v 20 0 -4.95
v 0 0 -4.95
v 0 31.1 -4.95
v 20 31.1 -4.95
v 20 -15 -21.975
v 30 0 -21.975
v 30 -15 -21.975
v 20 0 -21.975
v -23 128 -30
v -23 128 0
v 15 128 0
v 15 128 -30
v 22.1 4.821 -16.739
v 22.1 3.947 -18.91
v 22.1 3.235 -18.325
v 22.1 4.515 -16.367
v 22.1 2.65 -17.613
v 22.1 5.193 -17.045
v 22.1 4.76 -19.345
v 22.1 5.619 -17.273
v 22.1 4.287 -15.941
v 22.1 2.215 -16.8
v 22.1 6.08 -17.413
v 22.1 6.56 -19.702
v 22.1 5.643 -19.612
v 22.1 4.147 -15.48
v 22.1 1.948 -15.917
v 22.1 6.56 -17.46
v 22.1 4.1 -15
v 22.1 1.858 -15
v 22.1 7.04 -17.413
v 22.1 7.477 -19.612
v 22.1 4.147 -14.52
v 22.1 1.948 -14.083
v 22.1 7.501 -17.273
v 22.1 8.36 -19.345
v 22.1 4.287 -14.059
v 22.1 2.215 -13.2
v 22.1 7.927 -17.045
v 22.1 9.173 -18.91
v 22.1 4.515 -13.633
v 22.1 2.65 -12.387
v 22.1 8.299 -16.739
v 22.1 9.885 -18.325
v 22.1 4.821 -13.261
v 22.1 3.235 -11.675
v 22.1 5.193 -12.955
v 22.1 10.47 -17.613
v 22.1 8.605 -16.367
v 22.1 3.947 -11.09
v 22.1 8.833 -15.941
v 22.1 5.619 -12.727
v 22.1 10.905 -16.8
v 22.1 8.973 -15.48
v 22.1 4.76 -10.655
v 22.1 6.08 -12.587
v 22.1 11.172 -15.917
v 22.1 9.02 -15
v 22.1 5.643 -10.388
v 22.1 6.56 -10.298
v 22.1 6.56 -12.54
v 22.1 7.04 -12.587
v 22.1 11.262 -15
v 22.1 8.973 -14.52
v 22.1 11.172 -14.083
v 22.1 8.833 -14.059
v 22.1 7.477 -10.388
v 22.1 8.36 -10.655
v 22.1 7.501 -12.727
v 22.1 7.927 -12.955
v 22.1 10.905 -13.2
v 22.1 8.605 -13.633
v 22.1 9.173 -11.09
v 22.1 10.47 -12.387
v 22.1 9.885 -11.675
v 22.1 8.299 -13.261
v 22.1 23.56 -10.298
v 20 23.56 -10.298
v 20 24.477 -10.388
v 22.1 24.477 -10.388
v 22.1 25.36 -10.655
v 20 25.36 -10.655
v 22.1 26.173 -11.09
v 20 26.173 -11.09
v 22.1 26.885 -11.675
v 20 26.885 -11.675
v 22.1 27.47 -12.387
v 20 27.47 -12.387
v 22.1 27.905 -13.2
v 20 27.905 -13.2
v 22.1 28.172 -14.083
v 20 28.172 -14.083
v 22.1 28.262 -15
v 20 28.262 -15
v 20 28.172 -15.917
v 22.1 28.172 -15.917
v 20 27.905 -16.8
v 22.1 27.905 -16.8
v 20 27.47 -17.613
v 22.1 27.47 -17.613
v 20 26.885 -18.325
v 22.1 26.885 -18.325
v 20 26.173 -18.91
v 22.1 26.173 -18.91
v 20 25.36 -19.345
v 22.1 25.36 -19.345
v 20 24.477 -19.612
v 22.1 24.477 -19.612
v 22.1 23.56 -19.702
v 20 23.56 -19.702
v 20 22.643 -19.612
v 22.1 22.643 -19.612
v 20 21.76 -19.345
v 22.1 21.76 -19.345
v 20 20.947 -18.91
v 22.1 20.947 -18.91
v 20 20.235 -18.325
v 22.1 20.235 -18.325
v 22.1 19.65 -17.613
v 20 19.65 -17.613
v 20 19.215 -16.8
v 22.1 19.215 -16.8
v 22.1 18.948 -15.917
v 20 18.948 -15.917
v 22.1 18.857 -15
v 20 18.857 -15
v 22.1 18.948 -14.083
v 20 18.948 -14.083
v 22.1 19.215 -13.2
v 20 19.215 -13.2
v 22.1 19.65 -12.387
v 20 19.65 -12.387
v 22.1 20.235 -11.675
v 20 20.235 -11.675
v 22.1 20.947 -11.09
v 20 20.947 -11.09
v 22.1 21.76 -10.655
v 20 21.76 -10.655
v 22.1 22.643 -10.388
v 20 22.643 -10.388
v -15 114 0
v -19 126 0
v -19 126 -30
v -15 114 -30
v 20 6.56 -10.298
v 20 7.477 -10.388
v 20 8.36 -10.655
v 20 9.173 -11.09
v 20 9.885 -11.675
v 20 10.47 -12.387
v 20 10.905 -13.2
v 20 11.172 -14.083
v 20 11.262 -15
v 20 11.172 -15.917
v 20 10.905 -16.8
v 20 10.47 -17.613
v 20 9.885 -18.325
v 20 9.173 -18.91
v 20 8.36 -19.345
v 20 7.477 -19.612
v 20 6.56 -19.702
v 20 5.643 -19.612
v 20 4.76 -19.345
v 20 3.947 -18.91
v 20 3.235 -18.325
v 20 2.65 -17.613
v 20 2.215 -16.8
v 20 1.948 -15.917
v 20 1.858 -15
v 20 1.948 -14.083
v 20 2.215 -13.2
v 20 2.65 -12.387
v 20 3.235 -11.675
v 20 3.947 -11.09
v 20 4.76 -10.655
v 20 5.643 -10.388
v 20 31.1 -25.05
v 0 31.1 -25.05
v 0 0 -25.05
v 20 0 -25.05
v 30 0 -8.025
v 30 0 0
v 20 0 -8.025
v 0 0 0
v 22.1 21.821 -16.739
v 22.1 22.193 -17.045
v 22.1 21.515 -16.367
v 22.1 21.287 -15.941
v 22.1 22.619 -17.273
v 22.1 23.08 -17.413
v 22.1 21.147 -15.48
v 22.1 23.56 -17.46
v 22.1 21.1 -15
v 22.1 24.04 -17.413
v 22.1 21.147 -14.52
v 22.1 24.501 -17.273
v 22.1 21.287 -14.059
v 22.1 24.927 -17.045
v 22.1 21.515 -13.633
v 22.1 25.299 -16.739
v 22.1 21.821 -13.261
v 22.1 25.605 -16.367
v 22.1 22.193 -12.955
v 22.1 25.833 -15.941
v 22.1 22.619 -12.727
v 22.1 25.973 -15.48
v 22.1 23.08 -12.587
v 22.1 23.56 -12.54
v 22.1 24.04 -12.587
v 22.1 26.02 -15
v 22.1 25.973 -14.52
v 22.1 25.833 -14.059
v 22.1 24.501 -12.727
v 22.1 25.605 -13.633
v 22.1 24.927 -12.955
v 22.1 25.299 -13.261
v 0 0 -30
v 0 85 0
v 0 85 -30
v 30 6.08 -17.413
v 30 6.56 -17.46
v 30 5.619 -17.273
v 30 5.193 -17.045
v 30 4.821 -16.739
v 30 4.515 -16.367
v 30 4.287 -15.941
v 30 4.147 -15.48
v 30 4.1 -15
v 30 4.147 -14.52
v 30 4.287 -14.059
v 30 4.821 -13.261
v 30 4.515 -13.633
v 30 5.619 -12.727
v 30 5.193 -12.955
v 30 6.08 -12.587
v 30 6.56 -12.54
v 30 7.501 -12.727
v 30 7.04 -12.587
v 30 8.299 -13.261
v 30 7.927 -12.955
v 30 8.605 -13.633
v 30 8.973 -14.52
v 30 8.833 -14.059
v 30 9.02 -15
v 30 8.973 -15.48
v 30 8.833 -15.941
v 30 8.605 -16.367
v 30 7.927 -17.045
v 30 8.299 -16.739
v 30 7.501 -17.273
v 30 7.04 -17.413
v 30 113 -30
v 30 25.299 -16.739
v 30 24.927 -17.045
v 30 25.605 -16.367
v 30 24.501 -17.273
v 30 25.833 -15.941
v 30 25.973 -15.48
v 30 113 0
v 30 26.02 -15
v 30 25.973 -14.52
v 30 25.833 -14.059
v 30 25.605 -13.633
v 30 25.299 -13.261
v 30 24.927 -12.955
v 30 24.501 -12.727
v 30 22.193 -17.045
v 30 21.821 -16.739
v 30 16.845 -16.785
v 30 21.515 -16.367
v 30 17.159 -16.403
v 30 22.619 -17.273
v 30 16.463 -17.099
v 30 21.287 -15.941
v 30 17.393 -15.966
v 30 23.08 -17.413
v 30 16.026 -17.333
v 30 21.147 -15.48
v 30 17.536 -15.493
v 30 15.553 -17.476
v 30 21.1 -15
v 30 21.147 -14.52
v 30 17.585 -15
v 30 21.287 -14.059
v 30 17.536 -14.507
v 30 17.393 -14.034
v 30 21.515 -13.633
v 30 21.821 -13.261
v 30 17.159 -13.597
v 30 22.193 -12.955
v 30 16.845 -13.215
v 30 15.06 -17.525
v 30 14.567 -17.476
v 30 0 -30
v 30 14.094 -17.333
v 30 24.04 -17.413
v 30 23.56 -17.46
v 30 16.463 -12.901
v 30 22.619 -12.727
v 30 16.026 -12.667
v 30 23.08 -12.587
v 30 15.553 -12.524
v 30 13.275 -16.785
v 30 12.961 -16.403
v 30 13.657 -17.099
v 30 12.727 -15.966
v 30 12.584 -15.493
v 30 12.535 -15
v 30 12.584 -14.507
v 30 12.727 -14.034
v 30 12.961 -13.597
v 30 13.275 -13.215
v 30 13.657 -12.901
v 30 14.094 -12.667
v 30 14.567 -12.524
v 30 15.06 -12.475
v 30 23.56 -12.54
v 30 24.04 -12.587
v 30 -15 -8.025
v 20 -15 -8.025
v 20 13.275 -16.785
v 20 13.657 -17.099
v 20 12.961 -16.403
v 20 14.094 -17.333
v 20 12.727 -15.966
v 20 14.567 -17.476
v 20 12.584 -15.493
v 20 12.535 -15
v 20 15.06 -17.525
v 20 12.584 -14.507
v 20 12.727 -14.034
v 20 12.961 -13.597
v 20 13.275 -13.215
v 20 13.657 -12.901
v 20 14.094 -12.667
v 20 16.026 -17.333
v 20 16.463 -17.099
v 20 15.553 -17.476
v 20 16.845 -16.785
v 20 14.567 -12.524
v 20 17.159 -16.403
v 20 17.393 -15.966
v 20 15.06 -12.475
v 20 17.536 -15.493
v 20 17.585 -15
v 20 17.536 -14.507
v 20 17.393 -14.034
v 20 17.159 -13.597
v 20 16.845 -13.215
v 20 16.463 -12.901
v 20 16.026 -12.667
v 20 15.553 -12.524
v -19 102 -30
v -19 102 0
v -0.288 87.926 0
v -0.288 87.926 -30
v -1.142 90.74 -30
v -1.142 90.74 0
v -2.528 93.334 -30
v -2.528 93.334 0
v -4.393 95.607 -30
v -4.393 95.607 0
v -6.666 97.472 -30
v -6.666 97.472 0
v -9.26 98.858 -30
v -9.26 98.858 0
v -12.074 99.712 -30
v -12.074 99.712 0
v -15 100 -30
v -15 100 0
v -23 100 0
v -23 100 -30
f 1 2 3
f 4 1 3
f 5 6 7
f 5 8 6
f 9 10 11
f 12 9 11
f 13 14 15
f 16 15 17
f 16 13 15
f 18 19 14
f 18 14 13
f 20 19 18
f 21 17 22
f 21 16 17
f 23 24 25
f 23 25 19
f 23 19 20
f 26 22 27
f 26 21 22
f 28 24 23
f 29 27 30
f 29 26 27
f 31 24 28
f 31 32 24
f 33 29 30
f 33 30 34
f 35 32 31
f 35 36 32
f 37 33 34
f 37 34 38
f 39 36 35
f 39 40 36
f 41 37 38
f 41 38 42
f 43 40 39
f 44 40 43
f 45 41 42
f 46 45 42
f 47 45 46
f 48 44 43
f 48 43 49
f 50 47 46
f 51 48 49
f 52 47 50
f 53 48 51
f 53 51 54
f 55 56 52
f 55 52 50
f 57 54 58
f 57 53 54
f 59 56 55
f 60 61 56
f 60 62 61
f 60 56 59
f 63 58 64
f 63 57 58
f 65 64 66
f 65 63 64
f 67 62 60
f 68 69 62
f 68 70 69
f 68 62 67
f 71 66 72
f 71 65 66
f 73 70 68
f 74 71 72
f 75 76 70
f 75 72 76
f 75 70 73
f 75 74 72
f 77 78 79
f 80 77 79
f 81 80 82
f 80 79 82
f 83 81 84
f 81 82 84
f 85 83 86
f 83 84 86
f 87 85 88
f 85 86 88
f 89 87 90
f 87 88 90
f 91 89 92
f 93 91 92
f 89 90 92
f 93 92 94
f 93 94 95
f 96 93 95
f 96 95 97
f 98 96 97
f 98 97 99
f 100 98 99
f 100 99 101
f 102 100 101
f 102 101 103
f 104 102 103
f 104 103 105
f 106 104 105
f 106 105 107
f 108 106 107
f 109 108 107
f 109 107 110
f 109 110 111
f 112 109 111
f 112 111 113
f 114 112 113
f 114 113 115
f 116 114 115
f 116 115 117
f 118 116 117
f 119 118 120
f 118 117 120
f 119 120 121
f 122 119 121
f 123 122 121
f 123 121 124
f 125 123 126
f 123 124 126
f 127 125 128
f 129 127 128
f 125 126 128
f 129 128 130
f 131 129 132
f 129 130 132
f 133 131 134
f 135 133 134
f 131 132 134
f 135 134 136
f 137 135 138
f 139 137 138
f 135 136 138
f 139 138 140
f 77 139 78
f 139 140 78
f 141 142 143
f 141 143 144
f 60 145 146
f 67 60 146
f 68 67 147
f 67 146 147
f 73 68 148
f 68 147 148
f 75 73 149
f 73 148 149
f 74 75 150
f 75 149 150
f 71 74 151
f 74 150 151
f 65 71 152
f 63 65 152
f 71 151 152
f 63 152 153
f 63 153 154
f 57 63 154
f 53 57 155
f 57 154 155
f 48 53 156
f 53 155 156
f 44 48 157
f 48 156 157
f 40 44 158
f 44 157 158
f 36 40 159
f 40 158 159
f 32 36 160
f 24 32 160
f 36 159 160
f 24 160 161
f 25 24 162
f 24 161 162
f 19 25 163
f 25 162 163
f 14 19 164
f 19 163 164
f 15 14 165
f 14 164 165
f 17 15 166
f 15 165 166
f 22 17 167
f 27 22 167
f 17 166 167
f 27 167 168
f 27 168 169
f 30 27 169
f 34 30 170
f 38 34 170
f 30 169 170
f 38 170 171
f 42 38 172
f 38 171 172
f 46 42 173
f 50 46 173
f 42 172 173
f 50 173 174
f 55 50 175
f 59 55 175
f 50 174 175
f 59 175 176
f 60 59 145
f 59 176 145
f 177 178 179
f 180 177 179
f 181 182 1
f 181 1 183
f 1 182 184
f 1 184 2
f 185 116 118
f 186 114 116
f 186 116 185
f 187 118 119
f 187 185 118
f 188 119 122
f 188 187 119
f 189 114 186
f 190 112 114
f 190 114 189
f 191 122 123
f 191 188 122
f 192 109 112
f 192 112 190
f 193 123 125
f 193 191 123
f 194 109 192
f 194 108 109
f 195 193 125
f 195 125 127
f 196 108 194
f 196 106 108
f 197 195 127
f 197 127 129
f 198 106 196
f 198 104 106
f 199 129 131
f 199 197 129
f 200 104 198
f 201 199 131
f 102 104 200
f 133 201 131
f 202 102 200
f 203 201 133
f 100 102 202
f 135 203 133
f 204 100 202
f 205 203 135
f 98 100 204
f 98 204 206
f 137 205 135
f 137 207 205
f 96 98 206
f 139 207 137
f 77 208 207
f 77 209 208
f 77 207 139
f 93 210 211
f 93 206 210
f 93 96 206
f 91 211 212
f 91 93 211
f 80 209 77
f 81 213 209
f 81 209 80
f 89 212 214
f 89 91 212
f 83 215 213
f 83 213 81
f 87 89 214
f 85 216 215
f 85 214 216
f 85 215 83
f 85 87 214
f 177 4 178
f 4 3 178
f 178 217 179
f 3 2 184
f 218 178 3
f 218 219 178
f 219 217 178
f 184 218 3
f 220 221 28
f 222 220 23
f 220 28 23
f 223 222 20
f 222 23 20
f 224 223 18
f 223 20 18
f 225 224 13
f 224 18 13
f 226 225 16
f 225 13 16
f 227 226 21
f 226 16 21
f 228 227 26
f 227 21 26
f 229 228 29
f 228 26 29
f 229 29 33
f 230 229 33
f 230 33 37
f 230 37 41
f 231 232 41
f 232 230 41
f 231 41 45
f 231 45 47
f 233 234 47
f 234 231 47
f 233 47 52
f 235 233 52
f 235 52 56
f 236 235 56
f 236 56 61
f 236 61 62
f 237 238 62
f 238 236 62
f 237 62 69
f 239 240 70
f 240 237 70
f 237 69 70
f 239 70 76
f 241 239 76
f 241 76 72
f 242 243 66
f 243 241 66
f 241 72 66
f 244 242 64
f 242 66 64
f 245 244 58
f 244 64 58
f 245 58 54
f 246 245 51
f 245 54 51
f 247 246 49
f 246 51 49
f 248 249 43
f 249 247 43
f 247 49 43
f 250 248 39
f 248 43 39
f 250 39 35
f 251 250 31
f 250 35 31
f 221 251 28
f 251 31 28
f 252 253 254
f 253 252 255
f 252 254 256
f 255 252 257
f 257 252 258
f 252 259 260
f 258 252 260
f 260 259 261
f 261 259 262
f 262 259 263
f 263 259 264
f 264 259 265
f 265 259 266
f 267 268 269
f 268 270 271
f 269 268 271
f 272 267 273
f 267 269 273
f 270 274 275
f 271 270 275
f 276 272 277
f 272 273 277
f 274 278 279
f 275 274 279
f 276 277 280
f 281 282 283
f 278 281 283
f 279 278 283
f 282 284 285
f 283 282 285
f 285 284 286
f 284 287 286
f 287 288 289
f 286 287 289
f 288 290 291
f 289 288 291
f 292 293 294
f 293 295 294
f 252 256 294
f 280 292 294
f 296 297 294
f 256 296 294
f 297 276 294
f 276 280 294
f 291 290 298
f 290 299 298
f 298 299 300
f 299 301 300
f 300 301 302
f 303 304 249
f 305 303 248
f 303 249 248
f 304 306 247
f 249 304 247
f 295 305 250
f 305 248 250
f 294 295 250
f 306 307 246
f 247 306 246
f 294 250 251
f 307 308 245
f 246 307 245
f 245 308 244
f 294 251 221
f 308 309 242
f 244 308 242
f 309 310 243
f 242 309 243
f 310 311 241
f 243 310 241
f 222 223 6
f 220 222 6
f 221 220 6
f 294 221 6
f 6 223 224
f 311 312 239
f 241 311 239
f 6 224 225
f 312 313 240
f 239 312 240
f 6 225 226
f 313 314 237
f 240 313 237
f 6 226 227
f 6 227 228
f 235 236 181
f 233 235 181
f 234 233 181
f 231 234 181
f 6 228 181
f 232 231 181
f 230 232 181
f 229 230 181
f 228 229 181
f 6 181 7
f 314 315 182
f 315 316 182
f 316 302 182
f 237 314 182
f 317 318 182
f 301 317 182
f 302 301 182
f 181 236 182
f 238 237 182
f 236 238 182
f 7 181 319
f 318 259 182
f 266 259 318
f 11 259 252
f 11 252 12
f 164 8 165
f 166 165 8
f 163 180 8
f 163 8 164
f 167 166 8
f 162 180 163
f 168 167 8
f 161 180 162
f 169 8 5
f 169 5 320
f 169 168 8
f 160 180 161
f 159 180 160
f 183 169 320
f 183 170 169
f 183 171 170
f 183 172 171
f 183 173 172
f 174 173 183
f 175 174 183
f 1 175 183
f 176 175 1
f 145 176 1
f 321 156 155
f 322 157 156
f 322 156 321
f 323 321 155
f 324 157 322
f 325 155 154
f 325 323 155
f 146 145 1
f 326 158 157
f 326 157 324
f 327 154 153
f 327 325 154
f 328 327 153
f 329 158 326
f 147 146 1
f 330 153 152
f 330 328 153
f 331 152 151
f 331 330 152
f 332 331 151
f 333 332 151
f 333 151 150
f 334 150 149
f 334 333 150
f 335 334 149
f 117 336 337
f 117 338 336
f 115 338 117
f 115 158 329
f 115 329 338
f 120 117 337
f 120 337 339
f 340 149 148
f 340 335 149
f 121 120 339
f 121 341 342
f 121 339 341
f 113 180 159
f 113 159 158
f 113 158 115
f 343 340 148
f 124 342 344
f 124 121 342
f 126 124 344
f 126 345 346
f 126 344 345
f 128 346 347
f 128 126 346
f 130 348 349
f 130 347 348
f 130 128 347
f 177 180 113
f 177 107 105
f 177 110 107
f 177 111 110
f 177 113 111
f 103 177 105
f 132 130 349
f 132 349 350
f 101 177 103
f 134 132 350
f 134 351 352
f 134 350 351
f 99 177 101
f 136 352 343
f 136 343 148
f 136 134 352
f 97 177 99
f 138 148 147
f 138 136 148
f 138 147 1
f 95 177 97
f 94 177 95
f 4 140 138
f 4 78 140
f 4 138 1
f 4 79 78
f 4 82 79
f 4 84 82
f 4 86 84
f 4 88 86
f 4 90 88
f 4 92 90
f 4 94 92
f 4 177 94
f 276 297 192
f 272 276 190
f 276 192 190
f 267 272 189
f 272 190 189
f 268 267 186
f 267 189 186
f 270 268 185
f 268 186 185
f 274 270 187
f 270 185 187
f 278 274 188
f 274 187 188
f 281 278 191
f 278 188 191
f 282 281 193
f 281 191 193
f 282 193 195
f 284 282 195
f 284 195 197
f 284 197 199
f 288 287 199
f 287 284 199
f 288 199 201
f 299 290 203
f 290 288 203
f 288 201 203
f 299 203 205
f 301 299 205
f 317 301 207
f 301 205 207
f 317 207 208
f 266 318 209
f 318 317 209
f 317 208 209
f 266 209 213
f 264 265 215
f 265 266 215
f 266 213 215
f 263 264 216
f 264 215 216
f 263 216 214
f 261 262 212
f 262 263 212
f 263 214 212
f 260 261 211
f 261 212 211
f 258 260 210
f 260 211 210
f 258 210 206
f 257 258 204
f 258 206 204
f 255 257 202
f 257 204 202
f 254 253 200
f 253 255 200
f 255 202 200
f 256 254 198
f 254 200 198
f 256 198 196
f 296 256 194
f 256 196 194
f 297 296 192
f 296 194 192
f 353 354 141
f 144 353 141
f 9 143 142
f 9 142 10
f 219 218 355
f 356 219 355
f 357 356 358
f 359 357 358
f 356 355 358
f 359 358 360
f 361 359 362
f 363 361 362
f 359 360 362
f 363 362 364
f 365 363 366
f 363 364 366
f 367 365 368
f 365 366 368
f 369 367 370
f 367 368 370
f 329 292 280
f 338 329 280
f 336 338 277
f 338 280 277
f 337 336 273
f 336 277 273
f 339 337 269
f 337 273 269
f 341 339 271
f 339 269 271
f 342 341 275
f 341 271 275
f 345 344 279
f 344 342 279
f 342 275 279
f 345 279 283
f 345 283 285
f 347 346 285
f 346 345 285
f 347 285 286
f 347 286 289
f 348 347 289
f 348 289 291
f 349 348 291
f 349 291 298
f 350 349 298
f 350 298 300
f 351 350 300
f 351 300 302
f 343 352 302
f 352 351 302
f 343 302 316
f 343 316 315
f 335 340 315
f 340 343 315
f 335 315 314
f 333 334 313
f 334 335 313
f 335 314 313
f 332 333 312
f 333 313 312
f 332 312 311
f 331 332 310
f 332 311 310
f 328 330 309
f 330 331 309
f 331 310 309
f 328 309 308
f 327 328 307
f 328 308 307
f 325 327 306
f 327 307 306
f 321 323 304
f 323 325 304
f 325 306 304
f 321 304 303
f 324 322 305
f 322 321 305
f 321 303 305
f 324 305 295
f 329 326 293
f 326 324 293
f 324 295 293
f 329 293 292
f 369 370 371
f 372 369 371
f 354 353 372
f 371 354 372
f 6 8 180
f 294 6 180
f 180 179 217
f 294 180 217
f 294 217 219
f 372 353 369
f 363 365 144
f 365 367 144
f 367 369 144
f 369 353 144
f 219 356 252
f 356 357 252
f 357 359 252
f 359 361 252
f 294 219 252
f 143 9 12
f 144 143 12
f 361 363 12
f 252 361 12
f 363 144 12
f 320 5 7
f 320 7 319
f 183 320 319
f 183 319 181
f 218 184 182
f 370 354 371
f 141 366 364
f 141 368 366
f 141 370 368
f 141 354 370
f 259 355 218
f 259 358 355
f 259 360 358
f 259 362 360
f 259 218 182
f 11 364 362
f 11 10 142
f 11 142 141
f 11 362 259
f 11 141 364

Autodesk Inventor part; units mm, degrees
ref_plane "YZ Plane" through (0, 0, 0) normal (1, 0, 0) x (0, 1, 0)
ref_plane "XZ Plane" through (0, 0, 0) normal (0, 1, 0) x (-1, 0, 0)
ref_plane "XY Plane" through (0, 0, 0) normal (0, 0, 1) x (1, 0, 0)
sketch "Sketch1" plane through (0, 0, 0) normal (0, 0, 1) x (1, 0, 0)
  line L0 (0, 0) -> (25, 0)
  line L1 (25, 0) -> (25, 40)
  line L2 (25, 40) -> (0, 40)
  line L3 (0, 40) -> (0, 0)
  dimension "d1" = 25
  dimension "d2" = 40
  dimension "d3" = 25
extrude "Extrusion1" add sketch "Sketch1" against normal blind 30
sketch "Sketch2" plane through (25, 0, 0) normal (1, 0, 0) x (0, 0, -1)
  line L0 (0, 0) -> (30, 0) projected
  circle A0 centre (15, 6.56) radius 2.46
extrude "Extrusion2" cut sketch "Sketch2" against normal blind 30
sketch "Sketch3" plane through (0, 0, 0) normal (-1, 0, 0) x (0, 0, 1)
  line L0 (0, 0) -> (-30, 0) projected
  line L1 (-25.05, 0) -> (-4.95, 0)
  line L2 (-4.95, 0) -> (-4.95, 33.12)
  line L3 (-4.95, 33.12) -> (-25.05, 33.12)
  line L4 (-25.05, 33.12) -> (-25.05, 0)
  dimension "d11" = 20.1
extrude "Extrusion3" cut sketch "Sketch3" against normal blind 20
sketch "Sketch4" plane through (0, 0, 0) normal (0, -1, 0) x (1, 0, 0)
  line L0 (20, -4.95) -> (20, -25.05) projected
  line L1 (20, -15) -> (25, -15)
  line L2 (25, 0) -> (25, -30) projected
  line L3 (20, -8.025) -> (25, -8.025)
  line L4 (25, -8.025) -> (25, -21.975)
  line L5 (25, -21.975) -> (20, -21.975)
  line L6 (20, -21.975) -> (20, -8.025)
  line L7 (20, -8.025) -> (25, -21.975) construction
  line L8 (25, -8.025) -> (20, -21.975) construction
  line L9 (25, -12.54) -> (25, -17.46) projected
  point P0 (0, 0)
  point P1 (22.5, -15)
  dimension "d14" = 13.95
extrude "Extrusion4" add sketch "Sketch4" along normal blind 15
sketch "Sketch5" plane through (20, 0, 0) normal (-1, 0, 0) x (0, 0, 1)
  circle A0 centre (-15, 6.56) radius 2.46 projected
  circle A1 centre (-15, 6.56) radius 4.7025
  circle A2 centre (-15, 6.56) radius 2.46 projected
  circle A3 centre (-15, 6.56) radius 2.46
  point P0 (0, 0)
  dimension "d17" = 9.405
extrude "Extrusion5" cut sketch "Sketch5" against normal blind 2.1
sketch "Sketch6" plane through (25, 0, 0) normal (1, 0, 0) x (0, 0, -1)
  circle A0 centre (15, 6.56) radius 4.7025 projected
  line L0 (15, 6.56) -> (15, 23.56)
  circle A1 centre (15, 23.56) radius 2.46
  point P0 (0, 0)
  dimension "d20" = 17
  dimension "d21" = 4.92
extrude "Extrusion6" cut sketch "Sketch6" against normal blind 10 contours A1
sketch "Sketch7" plane through (20, 0, 0) normal (-1, 0, 0) x (0, 0, 1)
  circle A0 centre (-15, 23.56) radius 2.46 projected
  circle A1 centre (-15, 23.56) radius 4.7025
  point P0 (0, 0)
  dimension "d24" = 9.405
extrude "Extrusion7" cut sketch "Sketch7" against normal blind 2.1
sketch "Sketch9" plane through (25, 0, 0) normal (1, 0, 0) x (0, 0, -1)
  circle A0 centre (15, 6.56) radius 2.46 projected
  circle A1 centre (15, 6.56) radius 2.46
  circle A2 centre (15, 23.56) radius 2.46 projected
  circle A3 centre (15, 23.56) radius 2.46
  line L0 (30, 40) -> (30, 0) projected
  line L1 (30, 0) -> (30, 40)
  line L2 (30, 40) -> (0, 40)
  line L3 (0, 40) -> (0, 0)
  line L4 (0, 0) -> (8.025, 0) projected
  line L5 (21.975, 0) -> (21.975, -15)
  line L6 (21.975, -15) -> (8.025, -15)
  line L7 (8.025, -15) -> (8.025, 0)
  line L8 (0, 0) -> (8.025, 0)
  line L9 (21.975, 0) -> (30, 0)
extrude "Extrusion8" add sketch "Sketch9" along normal blind 5
sketch "Sketch10" plane through (0, 40, 0) normal (0, 1, 0) x (1, 0, 0)
  line L0 (0, 30) -> (30, 30) projected
  line L1 (30, 0) -> (0, 0) projected
  line L2 (0, 30) -> (30, 30)
  line L3 (30, 30) -> (30, 0)
  line L4 (30, 0) -> (0, 0)
  line L5 (0, 0) -> (0, 30)
extrude "Extrusion9" add sketch "Sketch10" along normal blind 30
sketch "Sketch12" plane through (30, 0, 0) normal (1, 0, 0) x (0, 0, -1)
  circle A0 centre (15, 6.56) radius 2.46 projected
  line L0 (15, 6.56) -> (15, 15.06)
  circle A1 centre (15, 15.06) radius 2.525
  point P0 (0, 0)
  dimension "d31" = 8.5
  dimension "d33" = 5.05
extrude "Extrusion10" cut sketch "Sketch12" against normal blind 30 contours A1
sketch "Sketch14" plane through (0, 0, 0) normal (0, 0, 1) x (1, 0, 0)
  line L0 (30, 70) -> (0, 70) projected
  line L1 (0, 70) -> (0, 85)
  line L2 (-15, 100) -> (-23, 100)
  line L3 (30, 0) -> (30, 70) projected
  line L4 (30, 113) -> (30, 70)
  arc A0 (0, 85) -> (-15, 100) centre (-15, 85) ccw
  line L5 (30, 105) -> (30, 100)
  line L6 (-23, 128) -> (15, 128)
  line L7 (-19, 126) -> (-23, 128)
  line L8 (-19, 126) -> (-15, 114)
  line L9 (-19, 102) -> (-23, 100)
  line L10 (-19, 102) -> (-15, 114)
  line L11 (30, 113) -> (15, 128)
  point P0 (0, 0)
  point P1 (0, 100)
  dimension "d47" = 30
  dimension "d54" = 15
  dimension "d69" = 28
extrude "Extrusion12" add sketch "Sketch14" against normal blind 30
sketch "Sketch15" plane through (0, 0, -25.05) normal (-1, 0, 0) x (0, 0, 1)
  line L0 (0, 33.12) -> (20.1, 33.12) projected
  line L1 (20.1, 33.12) -> (20.1, 0) projected
  line L2 (0, 33.12) -> (20.1, 33.12)
  line L3 (20.1, 33.12) -> (20.1, 31.1)
  line L4 (20.1, 31.1) -> (0, 31.1)
  line L5 (0, 31.1) -> (0, 33.12)
  point P0 (25.05, 0)
  dimension "d57" = 2.02
extrude "Extrusion13" add sketch "Sketch15" against normal blind 20
properties part number "24mm_x_30mm"
